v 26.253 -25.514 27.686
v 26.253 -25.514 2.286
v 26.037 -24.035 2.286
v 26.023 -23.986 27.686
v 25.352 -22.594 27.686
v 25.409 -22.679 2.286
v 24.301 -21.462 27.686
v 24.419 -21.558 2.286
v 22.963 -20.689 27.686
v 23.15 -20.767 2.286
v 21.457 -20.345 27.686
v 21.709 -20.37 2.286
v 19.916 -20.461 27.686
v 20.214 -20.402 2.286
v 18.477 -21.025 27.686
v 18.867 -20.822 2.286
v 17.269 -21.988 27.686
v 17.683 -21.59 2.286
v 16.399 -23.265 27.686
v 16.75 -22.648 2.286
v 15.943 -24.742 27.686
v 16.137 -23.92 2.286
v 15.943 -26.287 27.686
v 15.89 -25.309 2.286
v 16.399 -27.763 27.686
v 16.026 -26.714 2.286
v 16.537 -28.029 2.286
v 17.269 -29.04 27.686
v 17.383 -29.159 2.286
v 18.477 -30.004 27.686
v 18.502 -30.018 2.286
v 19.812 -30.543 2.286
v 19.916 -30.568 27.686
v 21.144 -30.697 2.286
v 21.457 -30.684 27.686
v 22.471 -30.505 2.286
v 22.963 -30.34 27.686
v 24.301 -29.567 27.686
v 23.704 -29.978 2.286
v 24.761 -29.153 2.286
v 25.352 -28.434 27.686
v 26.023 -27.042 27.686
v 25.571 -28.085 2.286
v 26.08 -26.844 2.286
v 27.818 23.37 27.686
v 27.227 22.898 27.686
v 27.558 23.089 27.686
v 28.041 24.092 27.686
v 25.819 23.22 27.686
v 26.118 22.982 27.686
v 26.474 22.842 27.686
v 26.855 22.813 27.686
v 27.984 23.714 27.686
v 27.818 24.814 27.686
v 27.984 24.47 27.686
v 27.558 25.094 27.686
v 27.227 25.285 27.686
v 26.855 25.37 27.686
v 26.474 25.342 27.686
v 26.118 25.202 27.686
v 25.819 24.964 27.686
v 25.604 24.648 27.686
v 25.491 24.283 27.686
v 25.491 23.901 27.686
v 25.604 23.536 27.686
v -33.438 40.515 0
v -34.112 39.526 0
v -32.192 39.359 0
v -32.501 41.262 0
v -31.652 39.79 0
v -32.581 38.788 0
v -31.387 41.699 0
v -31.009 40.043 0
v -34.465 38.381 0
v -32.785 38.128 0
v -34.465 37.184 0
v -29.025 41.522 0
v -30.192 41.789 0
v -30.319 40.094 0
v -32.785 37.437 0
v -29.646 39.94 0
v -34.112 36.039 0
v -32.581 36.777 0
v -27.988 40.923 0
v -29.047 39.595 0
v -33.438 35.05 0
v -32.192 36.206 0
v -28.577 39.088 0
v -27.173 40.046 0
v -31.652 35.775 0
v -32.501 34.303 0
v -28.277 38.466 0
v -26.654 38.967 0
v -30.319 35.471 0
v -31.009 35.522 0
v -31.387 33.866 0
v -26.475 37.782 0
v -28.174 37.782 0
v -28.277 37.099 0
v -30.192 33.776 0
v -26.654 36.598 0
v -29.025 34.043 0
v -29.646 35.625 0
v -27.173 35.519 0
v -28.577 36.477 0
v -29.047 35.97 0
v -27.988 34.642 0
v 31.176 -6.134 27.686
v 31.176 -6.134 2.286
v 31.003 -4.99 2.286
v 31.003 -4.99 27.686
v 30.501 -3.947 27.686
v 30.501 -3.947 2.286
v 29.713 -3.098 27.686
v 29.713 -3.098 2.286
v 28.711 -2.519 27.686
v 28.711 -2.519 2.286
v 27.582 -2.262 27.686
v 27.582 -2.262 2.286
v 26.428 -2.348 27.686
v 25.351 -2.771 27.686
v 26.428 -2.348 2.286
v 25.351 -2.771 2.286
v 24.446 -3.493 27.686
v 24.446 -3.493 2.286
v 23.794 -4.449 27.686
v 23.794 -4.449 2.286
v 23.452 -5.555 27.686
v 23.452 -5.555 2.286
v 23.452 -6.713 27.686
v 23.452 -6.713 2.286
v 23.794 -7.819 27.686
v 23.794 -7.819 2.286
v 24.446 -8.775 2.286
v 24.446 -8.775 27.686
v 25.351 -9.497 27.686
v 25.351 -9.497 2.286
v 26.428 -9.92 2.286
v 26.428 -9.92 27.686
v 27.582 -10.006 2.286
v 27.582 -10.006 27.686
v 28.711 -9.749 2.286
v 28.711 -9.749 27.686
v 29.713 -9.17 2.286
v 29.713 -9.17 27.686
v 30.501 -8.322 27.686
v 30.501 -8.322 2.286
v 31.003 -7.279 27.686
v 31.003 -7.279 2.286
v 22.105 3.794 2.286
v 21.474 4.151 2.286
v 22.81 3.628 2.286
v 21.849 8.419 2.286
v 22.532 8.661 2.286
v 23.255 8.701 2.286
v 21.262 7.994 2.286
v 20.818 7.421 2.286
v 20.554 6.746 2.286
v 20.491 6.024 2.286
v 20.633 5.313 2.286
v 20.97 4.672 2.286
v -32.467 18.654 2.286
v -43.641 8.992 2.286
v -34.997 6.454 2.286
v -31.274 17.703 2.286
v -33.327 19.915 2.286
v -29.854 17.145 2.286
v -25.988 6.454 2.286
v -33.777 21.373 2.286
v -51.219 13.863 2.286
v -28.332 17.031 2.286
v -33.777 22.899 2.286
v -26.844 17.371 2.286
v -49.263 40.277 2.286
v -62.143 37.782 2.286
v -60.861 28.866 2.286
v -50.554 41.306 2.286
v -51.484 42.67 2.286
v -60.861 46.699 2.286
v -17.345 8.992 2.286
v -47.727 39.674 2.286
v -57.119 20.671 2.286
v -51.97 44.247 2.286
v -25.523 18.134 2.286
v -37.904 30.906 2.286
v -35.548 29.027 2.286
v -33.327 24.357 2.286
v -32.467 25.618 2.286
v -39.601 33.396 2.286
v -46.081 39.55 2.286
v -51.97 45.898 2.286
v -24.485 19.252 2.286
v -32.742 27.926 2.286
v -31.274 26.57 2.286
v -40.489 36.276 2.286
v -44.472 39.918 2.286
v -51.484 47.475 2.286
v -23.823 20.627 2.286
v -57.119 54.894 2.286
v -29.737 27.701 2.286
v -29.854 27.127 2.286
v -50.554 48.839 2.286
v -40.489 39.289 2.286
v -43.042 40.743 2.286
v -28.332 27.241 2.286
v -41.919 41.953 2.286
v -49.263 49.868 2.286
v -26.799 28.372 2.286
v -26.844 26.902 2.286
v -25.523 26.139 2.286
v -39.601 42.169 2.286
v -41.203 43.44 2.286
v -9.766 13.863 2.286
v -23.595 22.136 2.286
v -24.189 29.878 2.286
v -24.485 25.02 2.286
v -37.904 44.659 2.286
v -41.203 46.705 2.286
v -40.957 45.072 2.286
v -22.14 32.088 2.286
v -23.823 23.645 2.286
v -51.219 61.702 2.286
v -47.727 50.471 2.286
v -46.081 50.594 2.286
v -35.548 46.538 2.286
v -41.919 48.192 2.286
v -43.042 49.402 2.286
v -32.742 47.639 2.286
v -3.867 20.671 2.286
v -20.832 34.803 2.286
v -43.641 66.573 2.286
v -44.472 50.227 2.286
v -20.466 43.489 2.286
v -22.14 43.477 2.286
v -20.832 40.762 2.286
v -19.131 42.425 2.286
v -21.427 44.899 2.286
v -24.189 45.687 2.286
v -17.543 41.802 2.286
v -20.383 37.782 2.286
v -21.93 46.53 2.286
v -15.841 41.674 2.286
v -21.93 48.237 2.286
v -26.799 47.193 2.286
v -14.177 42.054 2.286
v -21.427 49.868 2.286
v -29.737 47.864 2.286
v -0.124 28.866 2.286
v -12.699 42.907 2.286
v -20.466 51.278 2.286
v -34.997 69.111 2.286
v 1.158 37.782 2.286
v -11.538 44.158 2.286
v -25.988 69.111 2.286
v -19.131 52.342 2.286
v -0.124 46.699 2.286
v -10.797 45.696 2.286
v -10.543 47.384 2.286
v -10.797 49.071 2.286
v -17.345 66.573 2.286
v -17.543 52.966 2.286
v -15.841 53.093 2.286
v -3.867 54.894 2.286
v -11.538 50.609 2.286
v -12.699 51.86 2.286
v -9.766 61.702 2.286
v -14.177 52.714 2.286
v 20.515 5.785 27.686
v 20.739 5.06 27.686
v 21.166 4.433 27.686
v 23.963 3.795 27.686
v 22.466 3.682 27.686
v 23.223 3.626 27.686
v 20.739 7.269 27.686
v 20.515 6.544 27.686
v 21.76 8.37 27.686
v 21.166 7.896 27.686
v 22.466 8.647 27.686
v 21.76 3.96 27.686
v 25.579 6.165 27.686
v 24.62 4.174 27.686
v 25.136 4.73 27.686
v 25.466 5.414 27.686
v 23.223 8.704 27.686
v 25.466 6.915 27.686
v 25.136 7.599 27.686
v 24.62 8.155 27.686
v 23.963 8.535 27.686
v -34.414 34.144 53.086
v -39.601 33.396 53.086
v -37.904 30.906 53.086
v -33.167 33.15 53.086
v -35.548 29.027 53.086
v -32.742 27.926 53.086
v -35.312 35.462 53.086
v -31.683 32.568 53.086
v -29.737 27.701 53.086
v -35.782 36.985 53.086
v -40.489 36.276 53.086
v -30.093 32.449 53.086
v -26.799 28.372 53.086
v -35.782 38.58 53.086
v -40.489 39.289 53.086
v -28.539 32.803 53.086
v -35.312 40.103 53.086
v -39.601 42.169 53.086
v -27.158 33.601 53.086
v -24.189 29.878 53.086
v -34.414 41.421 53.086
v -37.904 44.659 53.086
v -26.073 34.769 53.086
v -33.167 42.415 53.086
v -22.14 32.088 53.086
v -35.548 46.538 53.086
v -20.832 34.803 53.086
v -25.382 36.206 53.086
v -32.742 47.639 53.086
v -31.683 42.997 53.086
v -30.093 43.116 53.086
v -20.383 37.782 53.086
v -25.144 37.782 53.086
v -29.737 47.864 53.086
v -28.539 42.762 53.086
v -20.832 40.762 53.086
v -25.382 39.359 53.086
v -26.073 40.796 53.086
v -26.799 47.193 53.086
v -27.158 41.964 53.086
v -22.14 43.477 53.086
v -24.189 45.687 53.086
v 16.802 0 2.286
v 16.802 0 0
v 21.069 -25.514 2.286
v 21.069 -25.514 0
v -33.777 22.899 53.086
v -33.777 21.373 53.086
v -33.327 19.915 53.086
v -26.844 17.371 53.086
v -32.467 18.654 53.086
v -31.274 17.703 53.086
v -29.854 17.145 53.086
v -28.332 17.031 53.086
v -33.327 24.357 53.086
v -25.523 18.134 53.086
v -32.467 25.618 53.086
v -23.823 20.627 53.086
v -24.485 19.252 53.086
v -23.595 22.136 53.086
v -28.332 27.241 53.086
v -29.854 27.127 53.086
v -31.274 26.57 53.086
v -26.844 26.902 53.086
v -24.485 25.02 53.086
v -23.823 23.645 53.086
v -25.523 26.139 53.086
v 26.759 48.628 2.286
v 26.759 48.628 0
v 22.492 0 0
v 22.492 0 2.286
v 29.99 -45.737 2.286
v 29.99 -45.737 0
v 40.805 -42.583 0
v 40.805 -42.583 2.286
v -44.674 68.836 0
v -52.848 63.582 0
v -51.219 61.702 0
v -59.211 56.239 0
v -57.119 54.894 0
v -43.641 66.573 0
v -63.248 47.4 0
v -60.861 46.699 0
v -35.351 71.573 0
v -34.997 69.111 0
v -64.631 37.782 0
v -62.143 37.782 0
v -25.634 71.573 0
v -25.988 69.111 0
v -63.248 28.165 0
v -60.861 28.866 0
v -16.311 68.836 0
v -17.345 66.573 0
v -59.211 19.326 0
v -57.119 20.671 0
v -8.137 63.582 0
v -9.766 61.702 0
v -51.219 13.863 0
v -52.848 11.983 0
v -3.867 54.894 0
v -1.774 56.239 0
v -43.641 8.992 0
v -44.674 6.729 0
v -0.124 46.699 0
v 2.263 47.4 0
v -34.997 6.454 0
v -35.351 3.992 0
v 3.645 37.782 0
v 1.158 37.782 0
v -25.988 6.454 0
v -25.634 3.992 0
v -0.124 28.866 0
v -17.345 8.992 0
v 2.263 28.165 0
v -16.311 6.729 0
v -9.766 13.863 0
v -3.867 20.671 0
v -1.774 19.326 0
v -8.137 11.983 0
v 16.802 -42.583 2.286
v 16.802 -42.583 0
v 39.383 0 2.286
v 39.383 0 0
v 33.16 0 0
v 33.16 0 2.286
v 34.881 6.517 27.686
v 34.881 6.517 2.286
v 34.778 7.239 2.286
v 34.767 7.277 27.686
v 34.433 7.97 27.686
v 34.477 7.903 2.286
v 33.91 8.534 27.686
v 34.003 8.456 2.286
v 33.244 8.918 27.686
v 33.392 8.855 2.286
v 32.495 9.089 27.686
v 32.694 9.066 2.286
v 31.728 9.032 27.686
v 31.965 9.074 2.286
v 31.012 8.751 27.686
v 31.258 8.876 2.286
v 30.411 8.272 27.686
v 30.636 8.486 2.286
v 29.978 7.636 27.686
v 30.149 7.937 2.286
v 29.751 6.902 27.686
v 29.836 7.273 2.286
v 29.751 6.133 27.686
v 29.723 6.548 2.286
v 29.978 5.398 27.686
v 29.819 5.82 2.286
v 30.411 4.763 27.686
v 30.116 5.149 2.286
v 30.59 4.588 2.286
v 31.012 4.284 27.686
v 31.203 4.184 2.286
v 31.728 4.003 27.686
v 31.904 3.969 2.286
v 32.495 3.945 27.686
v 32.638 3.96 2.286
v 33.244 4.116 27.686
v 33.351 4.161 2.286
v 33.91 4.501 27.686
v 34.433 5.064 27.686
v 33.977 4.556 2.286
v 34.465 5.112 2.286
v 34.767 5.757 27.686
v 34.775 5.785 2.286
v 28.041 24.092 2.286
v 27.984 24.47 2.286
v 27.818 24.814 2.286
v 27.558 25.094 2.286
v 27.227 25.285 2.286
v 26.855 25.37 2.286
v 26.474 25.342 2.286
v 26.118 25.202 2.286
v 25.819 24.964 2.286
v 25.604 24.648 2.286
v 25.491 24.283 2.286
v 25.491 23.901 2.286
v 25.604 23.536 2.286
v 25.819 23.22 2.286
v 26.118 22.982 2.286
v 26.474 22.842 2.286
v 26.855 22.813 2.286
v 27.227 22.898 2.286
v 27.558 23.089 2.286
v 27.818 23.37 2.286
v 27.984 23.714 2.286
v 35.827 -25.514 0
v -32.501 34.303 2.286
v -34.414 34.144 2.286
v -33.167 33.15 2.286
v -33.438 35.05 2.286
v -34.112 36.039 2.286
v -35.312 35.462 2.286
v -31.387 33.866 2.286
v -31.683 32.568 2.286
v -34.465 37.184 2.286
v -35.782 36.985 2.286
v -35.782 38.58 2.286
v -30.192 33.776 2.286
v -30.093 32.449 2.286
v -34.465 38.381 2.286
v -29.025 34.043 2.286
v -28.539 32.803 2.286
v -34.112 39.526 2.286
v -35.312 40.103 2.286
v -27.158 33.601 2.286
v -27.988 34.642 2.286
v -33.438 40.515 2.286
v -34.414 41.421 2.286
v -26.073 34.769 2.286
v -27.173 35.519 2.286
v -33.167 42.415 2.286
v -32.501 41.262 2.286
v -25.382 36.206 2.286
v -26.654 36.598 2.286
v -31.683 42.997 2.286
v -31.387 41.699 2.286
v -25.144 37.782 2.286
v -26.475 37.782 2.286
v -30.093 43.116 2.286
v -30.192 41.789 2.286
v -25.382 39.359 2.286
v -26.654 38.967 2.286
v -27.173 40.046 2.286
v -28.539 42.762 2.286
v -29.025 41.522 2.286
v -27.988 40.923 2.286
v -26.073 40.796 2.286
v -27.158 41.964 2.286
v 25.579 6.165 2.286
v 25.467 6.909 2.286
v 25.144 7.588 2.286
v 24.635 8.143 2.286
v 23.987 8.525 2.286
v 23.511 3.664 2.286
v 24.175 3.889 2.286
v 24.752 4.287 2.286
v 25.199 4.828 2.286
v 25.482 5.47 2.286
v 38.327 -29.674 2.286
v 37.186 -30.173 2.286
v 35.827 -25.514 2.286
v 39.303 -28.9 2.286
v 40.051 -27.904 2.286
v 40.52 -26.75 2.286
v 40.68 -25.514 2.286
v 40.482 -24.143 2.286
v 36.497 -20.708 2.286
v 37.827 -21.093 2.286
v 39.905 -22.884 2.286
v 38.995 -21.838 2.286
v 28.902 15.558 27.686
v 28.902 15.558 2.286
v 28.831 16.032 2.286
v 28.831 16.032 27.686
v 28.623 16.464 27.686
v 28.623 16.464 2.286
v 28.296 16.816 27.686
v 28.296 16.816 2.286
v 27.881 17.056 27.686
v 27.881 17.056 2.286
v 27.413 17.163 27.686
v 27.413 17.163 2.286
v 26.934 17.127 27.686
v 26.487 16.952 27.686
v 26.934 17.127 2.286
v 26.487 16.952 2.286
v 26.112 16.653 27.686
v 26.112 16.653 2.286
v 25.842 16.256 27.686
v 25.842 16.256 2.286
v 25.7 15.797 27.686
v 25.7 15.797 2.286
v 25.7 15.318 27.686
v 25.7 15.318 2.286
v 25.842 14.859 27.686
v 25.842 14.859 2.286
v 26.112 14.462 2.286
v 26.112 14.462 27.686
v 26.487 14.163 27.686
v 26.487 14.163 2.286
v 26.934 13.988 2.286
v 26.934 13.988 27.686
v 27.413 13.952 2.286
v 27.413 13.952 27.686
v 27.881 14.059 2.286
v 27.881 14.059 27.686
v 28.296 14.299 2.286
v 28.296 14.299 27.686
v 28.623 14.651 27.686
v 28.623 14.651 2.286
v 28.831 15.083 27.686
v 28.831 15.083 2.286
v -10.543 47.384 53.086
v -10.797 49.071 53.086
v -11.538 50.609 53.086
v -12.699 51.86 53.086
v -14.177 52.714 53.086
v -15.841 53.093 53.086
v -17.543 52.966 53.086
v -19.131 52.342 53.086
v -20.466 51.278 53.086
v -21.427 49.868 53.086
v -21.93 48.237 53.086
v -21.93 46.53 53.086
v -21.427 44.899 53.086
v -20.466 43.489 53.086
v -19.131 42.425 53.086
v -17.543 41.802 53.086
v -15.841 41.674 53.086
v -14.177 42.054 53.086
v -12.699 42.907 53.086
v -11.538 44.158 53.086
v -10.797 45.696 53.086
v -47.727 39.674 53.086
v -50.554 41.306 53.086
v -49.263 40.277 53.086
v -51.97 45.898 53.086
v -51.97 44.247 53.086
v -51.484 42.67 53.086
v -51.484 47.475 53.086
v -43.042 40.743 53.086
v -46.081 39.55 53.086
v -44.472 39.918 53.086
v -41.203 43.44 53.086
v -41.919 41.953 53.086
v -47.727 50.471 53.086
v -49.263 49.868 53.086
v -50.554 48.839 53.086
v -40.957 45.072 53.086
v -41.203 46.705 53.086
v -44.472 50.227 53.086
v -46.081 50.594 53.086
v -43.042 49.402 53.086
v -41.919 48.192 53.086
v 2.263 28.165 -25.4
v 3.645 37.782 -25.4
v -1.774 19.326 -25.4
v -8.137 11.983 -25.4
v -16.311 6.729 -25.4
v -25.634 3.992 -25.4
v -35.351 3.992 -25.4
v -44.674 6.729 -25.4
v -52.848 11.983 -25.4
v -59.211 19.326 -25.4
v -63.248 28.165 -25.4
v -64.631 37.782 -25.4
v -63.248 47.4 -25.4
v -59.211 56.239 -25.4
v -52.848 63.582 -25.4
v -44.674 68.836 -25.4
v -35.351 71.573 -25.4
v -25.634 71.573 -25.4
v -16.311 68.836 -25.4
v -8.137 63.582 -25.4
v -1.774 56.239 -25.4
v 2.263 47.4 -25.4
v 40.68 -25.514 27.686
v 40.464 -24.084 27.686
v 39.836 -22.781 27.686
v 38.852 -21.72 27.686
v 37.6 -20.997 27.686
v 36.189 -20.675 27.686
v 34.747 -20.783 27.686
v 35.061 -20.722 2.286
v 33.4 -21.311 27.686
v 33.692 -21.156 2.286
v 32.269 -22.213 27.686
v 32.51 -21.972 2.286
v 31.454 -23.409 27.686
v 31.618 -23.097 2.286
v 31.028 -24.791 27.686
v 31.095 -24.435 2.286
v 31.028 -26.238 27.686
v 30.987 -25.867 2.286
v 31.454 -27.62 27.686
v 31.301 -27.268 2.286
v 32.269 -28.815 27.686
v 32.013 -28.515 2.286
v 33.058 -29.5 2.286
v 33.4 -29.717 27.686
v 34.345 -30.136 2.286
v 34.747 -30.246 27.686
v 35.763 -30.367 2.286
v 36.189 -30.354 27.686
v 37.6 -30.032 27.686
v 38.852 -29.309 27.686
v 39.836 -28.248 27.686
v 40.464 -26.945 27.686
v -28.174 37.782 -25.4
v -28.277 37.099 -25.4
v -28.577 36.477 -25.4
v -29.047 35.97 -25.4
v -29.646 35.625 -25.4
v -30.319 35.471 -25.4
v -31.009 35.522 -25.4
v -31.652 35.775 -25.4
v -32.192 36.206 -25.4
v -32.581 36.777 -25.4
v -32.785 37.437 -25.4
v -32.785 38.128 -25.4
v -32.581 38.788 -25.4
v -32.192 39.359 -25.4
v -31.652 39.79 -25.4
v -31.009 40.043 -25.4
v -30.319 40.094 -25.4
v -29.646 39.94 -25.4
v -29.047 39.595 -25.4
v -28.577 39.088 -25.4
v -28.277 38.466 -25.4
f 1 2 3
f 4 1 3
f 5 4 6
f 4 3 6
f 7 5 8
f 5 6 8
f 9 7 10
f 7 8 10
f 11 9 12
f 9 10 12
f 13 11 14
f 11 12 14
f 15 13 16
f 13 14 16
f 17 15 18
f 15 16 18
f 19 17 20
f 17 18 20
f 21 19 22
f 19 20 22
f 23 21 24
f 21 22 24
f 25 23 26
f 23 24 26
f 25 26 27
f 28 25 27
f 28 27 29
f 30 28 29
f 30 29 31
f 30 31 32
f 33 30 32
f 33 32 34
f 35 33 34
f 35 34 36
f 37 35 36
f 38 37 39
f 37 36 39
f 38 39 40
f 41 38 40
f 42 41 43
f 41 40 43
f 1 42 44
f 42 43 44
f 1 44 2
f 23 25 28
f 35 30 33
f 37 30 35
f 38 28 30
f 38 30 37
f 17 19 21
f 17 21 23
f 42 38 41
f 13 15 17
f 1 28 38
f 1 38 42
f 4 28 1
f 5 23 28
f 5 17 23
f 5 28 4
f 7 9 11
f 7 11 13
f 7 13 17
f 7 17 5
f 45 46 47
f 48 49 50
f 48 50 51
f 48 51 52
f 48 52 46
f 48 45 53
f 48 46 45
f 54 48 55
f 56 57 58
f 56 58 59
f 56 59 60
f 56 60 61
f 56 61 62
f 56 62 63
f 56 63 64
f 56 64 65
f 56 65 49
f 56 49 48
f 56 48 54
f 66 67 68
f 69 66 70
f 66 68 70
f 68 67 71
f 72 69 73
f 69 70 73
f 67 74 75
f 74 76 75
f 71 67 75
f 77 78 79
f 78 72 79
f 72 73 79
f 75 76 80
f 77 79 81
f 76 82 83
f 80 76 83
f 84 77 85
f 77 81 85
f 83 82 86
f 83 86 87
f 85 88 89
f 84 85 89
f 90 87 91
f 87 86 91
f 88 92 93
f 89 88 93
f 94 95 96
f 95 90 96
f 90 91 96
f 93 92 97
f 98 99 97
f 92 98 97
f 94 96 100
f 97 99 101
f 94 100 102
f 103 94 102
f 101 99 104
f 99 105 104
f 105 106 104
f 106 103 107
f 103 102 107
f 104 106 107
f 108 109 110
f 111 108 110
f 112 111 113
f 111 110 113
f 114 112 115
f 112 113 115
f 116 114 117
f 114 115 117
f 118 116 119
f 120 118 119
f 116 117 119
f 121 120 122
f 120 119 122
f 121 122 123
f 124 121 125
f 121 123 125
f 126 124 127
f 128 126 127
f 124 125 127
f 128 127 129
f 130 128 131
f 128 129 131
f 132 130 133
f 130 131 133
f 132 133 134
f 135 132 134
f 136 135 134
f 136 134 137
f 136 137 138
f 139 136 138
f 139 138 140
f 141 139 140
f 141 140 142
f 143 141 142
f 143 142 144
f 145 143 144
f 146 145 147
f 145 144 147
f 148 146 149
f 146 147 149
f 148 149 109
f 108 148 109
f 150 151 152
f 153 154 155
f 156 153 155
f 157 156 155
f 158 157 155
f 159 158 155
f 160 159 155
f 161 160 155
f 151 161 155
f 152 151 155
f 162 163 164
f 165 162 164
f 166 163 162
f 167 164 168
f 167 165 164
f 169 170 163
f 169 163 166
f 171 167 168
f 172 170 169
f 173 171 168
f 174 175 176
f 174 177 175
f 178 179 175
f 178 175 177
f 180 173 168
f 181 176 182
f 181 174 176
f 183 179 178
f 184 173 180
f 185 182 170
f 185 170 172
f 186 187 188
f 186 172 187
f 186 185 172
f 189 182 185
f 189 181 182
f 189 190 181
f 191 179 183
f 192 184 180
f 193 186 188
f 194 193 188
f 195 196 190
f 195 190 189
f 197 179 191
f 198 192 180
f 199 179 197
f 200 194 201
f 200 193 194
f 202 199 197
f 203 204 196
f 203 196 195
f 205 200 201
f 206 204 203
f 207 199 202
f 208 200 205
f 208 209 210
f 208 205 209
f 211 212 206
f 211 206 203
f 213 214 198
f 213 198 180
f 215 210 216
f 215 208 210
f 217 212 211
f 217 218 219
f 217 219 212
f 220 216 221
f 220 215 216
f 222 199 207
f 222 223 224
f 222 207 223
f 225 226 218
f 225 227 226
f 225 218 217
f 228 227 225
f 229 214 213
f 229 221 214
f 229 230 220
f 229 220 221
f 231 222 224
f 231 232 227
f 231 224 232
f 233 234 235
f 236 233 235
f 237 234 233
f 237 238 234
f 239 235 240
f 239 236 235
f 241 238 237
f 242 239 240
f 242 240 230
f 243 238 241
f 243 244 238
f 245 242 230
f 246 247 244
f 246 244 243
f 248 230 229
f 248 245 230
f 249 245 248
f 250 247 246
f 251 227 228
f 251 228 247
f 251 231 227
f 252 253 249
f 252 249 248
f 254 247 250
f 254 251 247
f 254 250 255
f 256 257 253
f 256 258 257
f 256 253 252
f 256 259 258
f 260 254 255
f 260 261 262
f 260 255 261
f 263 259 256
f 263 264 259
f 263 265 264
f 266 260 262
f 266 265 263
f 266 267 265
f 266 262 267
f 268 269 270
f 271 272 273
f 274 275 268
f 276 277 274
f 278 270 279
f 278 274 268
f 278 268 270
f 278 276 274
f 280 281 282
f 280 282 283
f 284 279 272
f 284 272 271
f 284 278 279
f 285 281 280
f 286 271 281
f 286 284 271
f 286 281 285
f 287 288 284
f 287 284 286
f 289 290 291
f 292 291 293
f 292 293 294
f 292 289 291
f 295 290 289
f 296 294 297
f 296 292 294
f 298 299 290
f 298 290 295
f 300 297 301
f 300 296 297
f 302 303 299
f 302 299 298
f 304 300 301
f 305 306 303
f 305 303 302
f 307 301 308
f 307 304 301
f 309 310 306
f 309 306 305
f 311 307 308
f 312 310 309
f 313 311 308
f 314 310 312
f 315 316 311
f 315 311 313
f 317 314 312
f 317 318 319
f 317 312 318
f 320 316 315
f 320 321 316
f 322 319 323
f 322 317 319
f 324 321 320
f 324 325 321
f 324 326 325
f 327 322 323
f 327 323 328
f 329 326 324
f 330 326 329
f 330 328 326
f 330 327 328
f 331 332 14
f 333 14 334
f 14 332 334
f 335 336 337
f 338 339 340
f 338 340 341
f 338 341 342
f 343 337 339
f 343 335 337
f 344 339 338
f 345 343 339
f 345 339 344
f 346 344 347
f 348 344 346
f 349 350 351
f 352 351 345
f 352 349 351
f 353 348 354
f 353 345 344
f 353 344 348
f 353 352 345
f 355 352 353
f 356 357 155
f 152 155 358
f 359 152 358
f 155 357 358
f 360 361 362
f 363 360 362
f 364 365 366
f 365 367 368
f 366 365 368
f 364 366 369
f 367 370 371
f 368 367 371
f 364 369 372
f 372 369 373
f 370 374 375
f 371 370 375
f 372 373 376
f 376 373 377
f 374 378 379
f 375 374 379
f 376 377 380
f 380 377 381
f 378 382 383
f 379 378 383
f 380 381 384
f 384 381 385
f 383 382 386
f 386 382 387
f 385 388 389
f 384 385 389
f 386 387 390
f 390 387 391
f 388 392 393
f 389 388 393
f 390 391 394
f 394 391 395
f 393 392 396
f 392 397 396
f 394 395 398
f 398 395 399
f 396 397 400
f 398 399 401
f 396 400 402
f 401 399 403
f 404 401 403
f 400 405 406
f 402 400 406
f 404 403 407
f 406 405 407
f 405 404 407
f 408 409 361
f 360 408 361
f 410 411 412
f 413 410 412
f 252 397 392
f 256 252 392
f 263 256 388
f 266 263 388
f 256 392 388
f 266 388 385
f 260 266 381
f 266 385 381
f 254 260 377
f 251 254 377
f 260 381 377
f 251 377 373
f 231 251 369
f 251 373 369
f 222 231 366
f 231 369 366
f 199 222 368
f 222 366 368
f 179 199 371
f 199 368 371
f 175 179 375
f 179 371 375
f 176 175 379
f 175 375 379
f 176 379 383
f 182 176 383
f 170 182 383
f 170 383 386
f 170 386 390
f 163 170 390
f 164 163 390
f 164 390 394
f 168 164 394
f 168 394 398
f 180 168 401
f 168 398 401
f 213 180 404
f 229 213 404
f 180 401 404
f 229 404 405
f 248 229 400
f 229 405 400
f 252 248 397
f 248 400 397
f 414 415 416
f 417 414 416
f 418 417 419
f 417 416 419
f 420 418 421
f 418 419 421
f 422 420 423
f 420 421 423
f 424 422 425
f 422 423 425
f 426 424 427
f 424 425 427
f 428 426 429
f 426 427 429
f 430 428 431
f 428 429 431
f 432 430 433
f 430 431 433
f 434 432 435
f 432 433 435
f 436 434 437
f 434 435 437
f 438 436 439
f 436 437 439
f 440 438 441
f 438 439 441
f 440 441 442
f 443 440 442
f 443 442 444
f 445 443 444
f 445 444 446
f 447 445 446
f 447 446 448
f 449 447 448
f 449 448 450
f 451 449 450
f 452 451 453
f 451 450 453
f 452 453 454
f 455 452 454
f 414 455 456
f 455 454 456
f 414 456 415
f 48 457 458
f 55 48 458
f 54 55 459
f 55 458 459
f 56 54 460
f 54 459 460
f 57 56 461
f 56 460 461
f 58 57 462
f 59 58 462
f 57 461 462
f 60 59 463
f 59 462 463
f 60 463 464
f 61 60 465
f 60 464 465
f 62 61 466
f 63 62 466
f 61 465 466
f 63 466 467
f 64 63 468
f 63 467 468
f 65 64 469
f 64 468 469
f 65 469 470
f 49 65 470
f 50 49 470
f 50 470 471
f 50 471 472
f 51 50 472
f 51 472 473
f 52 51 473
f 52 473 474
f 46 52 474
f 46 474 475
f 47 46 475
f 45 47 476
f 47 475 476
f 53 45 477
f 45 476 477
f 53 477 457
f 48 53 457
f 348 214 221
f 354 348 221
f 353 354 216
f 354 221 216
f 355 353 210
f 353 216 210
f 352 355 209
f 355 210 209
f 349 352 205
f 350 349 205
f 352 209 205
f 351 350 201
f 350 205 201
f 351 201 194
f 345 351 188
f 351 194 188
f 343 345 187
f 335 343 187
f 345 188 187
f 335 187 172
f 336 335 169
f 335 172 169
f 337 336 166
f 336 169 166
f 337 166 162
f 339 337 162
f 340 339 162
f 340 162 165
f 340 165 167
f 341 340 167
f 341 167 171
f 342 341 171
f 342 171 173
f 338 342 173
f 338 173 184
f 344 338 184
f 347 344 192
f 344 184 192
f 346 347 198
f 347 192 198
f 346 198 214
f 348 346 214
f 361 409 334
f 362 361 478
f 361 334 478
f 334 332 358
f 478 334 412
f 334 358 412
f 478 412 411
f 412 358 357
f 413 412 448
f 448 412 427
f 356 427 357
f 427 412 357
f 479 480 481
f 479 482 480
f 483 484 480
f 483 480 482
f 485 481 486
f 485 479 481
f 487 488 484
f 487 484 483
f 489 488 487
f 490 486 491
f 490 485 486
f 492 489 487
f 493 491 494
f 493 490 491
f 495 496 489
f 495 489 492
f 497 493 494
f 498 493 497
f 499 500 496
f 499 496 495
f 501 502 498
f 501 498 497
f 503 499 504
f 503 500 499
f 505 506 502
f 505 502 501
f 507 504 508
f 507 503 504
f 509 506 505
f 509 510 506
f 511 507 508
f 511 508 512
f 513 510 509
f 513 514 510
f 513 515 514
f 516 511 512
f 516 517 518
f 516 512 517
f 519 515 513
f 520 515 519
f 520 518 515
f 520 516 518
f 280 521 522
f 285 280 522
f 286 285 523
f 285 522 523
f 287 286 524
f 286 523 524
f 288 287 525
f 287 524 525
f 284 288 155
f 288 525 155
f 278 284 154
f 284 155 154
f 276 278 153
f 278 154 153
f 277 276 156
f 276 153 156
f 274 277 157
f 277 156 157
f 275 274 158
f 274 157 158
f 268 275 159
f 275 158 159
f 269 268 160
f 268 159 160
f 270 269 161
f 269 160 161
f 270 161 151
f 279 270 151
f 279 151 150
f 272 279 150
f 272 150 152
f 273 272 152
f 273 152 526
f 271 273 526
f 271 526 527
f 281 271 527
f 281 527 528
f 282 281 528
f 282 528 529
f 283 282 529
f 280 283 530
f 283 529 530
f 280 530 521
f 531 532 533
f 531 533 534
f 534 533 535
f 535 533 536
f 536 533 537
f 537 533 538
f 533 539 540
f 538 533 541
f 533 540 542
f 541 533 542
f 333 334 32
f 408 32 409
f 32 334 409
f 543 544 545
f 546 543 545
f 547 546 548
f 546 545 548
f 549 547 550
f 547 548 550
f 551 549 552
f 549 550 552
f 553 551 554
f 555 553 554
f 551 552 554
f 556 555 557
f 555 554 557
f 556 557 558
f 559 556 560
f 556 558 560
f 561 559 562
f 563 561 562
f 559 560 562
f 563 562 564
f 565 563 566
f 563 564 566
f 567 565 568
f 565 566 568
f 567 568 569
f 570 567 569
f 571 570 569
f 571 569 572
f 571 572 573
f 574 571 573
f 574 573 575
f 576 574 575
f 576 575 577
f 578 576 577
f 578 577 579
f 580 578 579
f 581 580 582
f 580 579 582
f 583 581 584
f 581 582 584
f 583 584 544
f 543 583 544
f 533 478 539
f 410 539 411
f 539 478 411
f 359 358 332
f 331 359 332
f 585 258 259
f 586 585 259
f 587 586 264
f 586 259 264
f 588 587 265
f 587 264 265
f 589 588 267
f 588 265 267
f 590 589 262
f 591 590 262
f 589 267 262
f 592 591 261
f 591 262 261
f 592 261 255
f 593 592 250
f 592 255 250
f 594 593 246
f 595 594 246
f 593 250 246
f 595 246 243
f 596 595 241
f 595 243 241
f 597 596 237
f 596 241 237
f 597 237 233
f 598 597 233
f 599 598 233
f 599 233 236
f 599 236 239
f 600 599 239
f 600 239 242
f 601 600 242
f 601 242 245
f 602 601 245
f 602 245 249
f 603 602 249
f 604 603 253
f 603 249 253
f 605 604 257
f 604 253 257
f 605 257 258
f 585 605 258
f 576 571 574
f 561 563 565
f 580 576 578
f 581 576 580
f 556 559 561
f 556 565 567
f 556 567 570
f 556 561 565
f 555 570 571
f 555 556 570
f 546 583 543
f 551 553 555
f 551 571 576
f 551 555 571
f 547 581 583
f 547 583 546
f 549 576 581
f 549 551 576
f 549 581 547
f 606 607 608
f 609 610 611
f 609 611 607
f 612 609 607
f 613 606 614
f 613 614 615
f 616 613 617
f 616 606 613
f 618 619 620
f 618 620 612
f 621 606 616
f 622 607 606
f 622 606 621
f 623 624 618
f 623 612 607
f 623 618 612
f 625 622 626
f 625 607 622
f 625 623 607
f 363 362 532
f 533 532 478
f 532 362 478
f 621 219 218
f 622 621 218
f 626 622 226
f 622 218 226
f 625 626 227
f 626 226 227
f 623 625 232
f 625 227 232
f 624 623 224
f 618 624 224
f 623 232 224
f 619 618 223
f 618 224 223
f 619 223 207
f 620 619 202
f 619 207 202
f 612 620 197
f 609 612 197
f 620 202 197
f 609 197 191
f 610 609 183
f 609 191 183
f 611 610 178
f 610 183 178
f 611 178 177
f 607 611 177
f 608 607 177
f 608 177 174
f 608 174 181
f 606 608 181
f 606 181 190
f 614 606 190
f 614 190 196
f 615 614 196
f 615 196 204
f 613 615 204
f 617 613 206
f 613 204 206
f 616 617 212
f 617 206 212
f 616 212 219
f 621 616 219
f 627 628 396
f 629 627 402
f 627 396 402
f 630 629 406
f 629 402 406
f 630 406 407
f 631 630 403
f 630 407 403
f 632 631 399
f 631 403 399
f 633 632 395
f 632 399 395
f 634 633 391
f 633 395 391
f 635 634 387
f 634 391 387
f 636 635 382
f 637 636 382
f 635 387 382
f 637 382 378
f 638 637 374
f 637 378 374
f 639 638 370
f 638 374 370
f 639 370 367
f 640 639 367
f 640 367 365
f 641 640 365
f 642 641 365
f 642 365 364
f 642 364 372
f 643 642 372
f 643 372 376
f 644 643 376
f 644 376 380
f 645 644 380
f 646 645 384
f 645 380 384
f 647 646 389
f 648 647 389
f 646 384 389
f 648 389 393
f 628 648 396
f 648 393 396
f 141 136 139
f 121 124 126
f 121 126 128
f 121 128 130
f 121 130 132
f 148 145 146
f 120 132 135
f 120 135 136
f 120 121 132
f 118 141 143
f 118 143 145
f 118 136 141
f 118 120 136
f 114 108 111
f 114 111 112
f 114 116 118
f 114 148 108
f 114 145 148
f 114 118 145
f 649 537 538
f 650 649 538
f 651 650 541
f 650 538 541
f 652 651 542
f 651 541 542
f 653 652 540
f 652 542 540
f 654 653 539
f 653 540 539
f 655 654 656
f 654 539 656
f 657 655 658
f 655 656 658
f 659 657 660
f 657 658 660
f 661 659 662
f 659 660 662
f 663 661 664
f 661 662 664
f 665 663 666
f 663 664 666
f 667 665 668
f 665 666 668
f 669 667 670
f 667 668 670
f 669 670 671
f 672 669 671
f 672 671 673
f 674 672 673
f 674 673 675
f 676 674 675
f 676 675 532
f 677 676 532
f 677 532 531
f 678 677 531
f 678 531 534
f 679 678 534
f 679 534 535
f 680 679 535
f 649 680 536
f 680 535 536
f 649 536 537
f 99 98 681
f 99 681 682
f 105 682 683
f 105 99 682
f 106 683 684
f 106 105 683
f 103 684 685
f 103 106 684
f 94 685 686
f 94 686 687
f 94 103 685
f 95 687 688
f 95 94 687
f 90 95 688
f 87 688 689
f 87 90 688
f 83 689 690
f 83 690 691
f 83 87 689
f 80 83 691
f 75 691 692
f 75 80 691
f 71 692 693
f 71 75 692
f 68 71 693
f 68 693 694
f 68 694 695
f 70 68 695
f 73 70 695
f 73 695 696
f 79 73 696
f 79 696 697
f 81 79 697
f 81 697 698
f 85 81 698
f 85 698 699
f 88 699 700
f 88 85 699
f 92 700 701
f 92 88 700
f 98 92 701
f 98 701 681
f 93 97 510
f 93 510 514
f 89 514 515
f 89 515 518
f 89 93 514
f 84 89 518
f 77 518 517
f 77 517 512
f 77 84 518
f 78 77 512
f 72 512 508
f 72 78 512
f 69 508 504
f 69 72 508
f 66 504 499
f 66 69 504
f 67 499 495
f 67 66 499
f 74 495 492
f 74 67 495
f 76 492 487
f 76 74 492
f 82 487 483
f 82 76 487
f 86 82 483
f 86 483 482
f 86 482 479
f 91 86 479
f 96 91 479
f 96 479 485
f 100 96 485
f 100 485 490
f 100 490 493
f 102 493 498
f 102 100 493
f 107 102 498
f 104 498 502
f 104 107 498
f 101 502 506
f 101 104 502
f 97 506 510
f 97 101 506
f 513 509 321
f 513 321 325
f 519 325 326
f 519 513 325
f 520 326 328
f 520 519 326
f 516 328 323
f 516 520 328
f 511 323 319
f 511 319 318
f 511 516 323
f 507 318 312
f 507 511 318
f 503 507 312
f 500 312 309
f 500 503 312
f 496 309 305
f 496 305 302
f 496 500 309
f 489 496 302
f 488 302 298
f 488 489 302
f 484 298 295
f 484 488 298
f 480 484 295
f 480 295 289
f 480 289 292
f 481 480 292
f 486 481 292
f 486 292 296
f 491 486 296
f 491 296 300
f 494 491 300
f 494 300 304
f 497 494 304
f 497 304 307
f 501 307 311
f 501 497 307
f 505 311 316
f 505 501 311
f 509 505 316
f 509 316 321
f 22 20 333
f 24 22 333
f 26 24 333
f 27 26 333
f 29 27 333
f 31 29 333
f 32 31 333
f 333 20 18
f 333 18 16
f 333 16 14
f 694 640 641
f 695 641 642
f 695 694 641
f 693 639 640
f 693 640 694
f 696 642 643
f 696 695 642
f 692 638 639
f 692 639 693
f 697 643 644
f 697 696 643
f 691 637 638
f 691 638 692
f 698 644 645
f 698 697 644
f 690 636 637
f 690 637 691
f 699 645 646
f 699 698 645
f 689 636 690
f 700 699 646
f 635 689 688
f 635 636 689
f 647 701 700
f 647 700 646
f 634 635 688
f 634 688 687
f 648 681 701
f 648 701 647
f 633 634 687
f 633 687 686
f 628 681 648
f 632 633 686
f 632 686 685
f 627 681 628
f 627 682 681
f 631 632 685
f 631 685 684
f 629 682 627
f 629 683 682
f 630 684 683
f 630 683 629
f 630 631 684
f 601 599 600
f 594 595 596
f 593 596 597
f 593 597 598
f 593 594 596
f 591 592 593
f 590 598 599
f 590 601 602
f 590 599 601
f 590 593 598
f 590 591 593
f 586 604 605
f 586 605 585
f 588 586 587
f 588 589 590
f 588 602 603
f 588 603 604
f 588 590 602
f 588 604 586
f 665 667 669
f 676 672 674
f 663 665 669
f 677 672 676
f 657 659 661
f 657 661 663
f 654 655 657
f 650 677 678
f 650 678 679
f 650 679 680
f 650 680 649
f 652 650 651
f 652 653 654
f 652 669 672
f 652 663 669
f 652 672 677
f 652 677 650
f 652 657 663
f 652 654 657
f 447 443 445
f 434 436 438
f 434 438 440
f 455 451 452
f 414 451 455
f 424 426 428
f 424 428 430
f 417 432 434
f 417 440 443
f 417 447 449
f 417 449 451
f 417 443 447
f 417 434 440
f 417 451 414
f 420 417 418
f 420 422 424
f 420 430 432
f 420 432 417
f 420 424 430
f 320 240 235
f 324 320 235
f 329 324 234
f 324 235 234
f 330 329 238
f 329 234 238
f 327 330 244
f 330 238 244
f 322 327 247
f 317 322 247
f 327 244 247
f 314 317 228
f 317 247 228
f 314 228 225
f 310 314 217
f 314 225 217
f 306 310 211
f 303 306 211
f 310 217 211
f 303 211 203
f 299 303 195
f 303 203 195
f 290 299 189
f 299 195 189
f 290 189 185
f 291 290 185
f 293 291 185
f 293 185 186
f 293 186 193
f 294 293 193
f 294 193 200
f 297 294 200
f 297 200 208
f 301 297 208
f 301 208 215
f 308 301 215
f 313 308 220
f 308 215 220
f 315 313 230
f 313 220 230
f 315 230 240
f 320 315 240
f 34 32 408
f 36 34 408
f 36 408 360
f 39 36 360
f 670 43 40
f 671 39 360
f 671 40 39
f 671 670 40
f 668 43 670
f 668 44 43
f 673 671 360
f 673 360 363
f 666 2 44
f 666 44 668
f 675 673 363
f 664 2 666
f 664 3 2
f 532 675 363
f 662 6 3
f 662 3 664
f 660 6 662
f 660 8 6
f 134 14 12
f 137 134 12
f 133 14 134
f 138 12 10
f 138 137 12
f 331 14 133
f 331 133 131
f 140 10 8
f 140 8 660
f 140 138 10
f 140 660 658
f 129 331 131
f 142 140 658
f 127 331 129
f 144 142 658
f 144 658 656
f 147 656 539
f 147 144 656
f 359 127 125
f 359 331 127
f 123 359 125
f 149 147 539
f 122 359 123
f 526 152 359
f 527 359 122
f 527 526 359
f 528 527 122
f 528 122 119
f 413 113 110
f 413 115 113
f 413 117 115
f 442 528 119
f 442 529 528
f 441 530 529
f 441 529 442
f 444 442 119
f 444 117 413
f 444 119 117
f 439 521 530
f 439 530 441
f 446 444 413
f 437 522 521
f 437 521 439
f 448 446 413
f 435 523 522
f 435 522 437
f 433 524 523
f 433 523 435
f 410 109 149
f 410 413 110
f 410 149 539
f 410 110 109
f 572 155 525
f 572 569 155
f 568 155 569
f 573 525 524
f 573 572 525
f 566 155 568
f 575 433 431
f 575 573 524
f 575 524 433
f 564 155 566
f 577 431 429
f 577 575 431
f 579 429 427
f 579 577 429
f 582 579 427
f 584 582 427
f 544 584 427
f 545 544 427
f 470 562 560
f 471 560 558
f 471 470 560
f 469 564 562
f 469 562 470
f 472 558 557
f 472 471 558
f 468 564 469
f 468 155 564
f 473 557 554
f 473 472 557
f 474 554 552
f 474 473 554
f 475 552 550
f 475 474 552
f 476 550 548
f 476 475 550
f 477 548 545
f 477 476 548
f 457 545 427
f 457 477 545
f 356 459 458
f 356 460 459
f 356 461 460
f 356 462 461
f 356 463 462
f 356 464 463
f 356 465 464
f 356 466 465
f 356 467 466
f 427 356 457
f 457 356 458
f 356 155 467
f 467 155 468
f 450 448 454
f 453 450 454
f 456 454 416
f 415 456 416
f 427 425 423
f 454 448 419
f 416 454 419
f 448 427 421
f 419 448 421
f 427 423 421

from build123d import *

# Parameters (mm, degrees)
F0_R     = 31.650398
F0_R_2   = 4.017403
F1_DEPTH = 2.286
F2_R     = 10.109613
F2_R_2   = 5.348797
F2_R_3   = 5.537549
F2_R_4   = 5.725598
F2_R_5   = 5.119282
F3_DEPTH = 50.8
F4_R     = 34.138062
F4_R_2   = 2.318226
F5_DEPTH = 25.4
F7_DEPTH = 2.286
F8_R     = 1.610047
F8_R_2   = 2.545991
F8_R_3   = 2.579251
F8_R_4   = 1.282134
F8_R_5   = 3.88321
F8_R_6   = 5.183719
F8_R_7   = 4.852996
F9_DEPTH = 25.4


with BuildPart() as f1:
    # F0 (on Top) → F1 (new body)
    with BuildSketch(Plane.XY):
        with Locations((-30.492701, 37.782498)):
            Circle(F0_R)
        with Locations((-30.492701, 37.782498)):
            Circle(F0_R_2, mode=Mode.SUBTRACT)
    extrude(amount=F1_DEPTH)

    # F2 (on face) → F3 (join)
    with BuildSketch(Plane.XY.offset(2.286)):
        with Locations((-30.492701, 37.782498)):
            Circle(F2_R)
        with Locations((-30.492701, 37.782498)):
            Circle(F2_R_2, mode=Mode.SUBTRACT)
        with Locations((-46.4947, 45.072302)):
            Circle(F2_R_3)
        with Locations((-16.2687, 47.3837)):
            Circle(F2_R_4)
        with Locations((-28.7147, 22.136101)):
            Circle(F2_R_5)
    extrude(amount=F3_DEPTH)

    # F4 (on face) → F5 (join)
    with BuildSketch(Plane(origin=(0, 0, 0), x_dir=(1, 0, 0), z_dir=(0, 0, -1))):
        with Locations((-30.492701, -37.782498)):
            Circle(F4_R)
        with Locations((-30.492701, -37.782498)):
            Circle(F4_R_2, mode=Mode.SUBTRACT)
    extrude(amount=F5_DEPTH)


with BuildPart() as f7:
    # F6 (on Top) → F7 (new body)
    with BuildSketch(Plane.XY):
        Polygon((33.159703, 0), (26.758902, 48.6283), (22.491701, 0), align=None)
        Polygon((33.159703, 0), (22.491701, 0), (16.802099, 0), (21.069299, -25.514301), (16.802099, -42.5831), (29.990306, -45.737416), (40.805101, -42.5831), (35.826702, -25.514301), (39.3827, 0), align=None)
    extrude(amount=F7_DEPTH)

    # F8 (on face) → F9 (join)
    with BuildSketch(Plane.XY.offset(2.286)):
        with Locations((27.292302, 15.557501)):
            Circle(F8_R)
        with Locations((23.032657, 6.164642)):
            Circle(F8_R_2)
        with Locations((32.301862, 6.517205)):
            Circle(F8_R_3)
        with Locations((26.758902, 24.091899)):
            Circle(F8_R_4)
        with Locations((27.292302, -6.1341)):
            Circle(F8_R_5)
        with Locations((21.069299, -25.514301)):
            Circle(F8_R_6)
        with Locations((35.826702, -25.514301)):
            Circle(F8_R_7)
    extrude(amount=F9_DEPTH)


solid = Compound([f1.part, f7.part])
